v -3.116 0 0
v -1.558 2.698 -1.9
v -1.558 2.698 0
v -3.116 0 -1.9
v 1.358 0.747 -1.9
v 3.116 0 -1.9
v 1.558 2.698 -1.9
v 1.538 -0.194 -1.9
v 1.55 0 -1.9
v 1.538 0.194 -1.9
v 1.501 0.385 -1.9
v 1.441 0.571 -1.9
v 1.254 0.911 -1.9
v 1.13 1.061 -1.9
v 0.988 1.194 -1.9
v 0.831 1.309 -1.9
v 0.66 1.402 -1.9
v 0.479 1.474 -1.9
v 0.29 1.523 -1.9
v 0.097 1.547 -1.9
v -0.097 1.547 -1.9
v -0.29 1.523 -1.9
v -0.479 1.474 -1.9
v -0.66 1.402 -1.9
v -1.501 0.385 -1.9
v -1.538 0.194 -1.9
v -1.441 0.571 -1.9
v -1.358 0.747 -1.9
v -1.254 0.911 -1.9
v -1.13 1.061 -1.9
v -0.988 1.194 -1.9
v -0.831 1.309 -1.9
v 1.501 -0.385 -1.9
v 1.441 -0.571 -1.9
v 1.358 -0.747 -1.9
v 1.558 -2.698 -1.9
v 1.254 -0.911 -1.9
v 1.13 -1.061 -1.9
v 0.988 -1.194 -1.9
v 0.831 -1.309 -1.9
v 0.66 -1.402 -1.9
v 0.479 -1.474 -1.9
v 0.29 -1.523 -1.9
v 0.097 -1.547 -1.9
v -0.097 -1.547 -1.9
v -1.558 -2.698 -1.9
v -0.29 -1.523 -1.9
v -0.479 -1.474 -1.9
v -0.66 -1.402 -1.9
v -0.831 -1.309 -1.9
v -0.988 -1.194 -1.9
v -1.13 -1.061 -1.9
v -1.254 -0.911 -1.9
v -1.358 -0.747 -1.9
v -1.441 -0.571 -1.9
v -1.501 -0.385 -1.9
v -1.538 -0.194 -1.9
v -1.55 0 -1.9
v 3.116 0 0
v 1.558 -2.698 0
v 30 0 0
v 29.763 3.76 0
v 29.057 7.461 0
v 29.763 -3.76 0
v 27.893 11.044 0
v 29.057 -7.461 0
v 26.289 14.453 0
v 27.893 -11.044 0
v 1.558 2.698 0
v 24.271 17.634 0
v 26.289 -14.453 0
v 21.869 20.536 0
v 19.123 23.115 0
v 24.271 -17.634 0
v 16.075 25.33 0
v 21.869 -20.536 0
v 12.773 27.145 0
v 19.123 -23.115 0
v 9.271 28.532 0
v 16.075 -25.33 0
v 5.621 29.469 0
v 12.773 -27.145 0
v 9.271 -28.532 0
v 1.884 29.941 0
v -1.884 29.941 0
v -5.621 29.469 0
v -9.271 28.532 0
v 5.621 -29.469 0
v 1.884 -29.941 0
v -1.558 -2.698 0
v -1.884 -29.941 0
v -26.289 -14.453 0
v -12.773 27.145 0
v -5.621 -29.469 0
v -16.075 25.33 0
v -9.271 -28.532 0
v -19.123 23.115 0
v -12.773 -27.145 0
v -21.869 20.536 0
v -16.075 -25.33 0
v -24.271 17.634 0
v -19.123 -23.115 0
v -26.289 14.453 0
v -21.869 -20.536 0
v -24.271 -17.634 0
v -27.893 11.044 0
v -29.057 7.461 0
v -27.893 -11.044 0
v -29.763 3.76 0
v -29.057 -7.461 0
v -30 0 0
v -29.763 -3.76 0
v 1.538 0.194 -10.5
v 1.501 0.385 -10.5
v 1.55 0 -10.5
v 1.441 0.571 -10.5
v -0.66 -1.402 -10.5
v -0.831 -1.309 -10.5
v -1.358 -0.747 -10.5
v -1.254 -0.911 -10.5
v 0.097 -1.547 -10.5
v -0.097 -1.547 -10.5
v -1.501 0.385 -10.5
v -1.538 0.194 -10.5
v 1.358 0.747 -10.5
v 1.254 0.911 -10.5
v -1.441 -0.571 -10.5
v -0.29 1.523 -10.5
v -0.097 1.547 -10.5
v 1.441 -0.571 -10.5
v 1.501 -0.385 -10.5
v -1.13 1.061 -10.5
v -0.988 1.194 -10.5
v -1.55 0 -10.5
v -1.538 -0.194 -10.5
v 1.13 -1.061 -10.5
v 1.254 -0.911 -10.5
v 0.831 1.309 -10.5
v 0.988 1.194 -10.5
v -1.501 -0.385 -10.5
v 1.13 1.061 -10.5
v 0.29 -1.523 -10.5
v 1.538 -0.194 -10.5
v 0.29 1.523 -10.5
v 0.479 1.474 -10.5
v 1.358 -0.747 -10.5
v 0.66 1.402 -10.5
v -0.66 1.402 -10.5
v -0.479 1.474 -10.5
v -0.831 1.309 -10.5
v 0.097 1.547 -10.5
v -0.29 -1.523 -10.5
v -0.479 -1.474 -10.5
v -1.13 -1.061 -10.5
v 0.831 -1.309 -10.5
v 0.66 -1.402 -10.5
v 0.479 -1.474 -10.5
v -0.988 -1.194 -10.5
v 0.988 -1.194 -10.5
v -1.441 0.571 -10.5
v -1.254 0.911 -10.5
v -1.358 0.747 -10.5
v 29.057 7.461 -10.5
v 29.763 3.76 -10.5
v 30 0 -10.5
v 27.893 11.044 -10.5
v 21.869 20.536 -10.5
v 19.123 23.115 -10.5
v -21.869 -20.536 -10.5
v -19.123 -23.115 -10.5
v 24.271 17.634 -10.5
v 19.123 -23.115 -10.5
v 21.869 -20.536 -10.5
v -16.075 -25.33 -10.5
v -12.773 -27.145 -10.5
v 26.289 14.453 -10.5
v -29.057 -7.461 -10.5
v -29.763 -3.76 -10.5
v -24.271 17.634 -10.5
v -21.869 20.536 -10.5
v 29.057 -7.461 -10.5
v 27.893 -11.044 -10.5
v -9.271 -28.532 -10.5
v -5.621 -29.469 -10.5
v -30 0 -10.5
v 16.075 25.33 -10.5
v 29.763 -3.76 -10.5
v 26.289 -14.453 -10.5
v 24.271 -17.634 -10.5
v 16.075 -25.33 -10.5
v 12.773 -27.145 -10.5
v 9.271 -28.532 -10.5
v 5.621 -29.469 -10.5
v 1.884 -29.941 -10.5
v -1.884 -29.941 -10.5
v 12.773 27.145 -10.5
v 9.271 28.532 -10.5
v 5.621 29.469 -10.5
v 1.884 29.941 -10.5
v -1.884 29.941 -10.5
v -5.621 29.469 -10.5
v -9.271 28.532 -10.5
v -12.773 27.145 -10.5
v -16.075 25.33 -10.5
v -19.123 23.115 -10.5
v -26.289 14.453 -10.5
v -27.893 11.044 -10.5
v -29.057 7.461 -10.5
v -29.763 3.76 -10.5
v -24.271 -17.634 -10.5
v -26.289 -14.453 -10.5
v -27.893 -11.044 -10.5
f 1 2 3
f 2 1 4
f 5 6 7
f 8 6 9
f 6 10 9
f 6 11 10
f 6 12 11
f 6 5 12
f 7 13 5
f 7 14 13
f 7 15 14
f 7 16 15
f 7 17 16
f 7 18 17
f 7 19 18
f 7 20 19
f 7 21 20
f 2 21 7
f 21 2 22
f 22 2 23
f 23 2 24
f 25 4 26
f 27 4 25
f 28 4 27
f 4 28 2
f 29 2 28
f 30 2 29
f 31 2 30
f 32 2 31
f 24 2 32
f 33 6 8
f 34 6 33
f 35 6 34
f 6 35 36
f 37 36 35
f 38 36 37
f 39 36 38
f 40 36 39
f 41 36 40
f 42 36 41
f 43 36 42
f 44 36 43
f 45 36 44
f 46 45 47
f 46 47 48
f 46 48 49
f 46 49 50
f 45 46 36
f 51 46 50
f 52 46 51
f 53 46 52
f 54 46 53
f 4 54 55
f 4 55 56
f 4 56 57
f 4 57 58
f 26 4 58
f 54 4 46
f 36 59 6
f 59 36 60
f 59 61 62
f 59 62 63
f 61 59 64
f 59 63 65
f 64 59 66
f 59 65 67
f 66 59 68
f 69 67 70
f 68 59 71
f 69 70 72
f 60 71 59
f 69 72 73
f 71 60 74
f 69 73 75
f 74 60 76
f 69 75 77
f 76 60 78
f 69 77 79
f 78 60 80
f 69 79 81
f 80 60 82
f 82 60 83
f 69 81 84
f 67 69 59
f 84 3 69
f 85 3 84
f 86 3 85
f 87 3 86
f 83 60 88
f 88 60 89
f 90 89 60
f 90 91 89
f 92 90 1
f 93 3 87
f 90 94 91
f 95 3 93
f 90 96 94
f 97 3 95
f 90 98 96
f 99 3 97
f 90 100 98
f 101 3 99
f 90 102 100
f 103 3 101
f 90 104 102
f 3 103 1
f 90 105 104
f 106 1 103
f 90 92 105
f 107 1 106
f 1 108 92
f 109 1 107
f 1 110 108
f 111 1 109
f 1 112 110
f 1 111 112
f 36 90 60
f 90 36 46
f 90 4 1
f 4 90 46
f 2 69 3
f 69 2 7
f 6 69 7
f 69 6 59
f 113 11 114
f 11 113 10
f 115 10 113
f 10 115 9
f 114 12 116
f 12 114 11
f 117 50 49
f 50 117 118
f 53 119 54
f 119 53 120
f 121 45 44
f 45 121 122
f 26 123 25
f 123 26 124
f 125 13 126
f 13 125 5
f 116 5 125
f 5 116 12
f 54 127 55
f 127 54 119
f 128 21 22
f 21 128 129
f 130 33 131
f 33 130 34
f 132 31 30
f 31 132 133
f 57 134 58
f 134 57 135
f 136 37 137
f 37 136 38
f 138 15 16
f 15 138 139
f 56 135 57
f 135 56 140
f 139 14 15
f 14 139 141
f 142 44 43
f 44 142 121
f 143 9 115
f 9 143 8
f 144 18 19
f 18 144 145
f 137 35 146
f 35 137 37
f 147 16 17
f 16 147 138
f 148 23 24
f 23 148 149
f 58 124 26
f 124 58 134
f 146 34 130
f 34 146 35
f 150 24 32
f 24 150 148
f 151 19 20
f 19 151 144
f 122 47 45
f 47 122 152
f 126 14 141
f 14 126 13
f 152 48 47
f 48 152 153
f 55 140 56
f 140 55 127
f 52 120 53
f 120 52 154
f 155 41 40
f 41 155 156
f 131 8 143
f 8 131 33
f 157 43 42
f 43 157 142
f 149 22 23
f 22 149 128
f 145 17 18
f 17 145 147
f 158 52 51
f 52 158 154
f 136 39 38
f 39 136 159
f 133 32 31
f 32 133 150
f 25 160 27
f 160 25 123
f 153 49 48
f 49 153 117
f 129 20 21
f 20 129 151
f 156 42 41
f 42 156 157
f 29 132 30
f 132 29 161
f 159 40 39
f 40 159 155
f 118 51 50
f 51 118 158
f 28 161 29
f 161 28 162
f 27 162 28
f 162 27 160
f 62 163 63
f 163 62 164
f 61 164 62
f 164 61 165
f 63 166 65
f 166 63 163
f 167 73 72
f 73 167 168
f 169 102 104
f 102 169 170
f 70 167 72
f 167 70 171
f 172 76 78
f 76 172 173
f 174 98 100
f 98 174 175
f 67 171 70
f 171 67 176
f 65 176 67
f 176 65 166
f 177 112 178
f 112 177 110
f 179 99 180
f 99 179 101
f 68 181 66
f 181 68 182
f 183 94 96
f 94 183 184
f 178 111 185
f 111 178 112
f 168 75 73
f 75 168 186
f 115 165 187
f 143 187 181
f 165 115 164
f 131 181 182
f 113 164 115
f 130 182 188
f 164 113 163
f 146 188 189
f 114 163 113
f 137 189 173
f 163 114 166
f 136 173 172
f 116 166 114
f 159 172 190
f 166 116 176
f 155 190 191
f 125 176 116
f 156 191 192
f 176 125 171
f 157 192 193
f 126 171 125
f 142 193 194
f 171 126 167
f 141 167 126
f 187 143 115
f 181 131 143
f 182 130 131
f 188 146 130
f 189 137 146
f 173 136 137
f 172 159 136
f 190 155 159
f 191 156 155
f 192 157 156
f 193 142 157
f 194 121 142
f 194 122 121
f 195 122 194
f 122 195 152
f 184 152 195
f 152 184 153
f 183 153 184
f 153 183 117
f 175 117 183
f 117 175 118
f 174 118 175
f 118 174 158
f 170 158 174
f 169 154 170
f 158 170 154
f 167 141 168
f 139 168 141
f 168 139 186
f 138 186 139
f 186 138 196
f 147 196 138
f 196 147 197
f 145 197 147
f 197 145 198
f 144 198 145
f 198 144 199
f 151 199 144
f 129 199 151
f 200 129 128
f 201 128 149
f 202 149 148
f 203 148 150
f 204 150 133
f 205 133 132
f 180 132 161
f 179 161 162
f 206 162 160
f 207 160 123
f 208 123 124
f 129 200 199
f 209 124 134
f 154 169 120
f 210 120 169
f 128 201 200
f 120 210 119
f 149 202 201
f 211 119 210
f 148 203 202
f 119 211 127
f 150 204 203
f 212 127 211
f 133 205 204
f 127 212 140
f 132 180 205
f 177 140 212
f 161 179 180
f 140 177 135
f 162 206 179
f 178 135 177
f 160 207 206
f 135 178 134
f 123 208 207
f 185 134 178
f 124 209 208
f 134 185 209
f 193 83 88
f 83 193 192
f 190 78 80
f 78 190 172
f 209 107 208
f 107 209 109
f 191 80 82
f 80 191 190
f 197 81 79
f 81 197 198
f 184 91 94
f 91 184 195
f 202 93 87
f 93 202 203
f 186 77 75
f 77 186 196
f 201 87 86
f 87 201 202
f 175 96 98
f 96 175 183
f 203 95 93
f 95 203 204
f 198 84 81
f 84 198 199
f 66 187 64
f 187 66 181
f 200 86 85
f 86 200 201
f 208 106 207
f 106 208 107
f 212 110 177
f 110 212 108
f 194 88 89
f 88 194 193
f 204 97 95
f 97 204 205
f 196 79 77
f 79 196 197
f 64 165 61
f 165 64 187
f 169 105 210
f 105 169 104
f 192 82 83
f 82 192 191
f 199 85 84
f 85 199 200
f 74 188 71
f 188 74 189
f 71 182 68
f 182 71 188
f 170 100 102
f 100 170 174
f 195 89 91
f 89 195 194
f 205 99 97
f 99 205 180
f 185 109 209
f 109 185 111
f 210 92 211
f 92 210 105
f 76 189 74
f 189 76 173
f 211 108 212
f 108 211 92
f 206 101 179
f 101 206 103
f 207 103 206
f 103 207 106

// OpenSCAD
$fn = 50;


difference() {
	union() {
		translate(v = [0, 0, -10.5000000000]) {
			cylinder(h = 10.5000000000, r = 30.0000000000);
		}
	}
	union() {
		translate(v = [0, 0, 0]) {
			rotate(a = [0, 0, 0]) {
				difference() {
					union() {
						translate(v = [0, 0, -1.9000000000]) {
							linear_extrude(height = 1.9000000000) {
								polygon(points = [[3.1158000000, 0.0000000000], [1.5579000000, 2.6983619531], [-1.5579000000, 2.6983619531], [-3.1158000000, 0.0000000000], [-1.5579000000, -2.6983619531], [1.5579000000, -2.6983619531]]);
							}
						}
					}
					union();
				}
			}
		}
		#translate(v = [0, 0, -100.0000000000]) {
			cylinder(h = 200, r = 1.5500000000);
		}
	}
}
